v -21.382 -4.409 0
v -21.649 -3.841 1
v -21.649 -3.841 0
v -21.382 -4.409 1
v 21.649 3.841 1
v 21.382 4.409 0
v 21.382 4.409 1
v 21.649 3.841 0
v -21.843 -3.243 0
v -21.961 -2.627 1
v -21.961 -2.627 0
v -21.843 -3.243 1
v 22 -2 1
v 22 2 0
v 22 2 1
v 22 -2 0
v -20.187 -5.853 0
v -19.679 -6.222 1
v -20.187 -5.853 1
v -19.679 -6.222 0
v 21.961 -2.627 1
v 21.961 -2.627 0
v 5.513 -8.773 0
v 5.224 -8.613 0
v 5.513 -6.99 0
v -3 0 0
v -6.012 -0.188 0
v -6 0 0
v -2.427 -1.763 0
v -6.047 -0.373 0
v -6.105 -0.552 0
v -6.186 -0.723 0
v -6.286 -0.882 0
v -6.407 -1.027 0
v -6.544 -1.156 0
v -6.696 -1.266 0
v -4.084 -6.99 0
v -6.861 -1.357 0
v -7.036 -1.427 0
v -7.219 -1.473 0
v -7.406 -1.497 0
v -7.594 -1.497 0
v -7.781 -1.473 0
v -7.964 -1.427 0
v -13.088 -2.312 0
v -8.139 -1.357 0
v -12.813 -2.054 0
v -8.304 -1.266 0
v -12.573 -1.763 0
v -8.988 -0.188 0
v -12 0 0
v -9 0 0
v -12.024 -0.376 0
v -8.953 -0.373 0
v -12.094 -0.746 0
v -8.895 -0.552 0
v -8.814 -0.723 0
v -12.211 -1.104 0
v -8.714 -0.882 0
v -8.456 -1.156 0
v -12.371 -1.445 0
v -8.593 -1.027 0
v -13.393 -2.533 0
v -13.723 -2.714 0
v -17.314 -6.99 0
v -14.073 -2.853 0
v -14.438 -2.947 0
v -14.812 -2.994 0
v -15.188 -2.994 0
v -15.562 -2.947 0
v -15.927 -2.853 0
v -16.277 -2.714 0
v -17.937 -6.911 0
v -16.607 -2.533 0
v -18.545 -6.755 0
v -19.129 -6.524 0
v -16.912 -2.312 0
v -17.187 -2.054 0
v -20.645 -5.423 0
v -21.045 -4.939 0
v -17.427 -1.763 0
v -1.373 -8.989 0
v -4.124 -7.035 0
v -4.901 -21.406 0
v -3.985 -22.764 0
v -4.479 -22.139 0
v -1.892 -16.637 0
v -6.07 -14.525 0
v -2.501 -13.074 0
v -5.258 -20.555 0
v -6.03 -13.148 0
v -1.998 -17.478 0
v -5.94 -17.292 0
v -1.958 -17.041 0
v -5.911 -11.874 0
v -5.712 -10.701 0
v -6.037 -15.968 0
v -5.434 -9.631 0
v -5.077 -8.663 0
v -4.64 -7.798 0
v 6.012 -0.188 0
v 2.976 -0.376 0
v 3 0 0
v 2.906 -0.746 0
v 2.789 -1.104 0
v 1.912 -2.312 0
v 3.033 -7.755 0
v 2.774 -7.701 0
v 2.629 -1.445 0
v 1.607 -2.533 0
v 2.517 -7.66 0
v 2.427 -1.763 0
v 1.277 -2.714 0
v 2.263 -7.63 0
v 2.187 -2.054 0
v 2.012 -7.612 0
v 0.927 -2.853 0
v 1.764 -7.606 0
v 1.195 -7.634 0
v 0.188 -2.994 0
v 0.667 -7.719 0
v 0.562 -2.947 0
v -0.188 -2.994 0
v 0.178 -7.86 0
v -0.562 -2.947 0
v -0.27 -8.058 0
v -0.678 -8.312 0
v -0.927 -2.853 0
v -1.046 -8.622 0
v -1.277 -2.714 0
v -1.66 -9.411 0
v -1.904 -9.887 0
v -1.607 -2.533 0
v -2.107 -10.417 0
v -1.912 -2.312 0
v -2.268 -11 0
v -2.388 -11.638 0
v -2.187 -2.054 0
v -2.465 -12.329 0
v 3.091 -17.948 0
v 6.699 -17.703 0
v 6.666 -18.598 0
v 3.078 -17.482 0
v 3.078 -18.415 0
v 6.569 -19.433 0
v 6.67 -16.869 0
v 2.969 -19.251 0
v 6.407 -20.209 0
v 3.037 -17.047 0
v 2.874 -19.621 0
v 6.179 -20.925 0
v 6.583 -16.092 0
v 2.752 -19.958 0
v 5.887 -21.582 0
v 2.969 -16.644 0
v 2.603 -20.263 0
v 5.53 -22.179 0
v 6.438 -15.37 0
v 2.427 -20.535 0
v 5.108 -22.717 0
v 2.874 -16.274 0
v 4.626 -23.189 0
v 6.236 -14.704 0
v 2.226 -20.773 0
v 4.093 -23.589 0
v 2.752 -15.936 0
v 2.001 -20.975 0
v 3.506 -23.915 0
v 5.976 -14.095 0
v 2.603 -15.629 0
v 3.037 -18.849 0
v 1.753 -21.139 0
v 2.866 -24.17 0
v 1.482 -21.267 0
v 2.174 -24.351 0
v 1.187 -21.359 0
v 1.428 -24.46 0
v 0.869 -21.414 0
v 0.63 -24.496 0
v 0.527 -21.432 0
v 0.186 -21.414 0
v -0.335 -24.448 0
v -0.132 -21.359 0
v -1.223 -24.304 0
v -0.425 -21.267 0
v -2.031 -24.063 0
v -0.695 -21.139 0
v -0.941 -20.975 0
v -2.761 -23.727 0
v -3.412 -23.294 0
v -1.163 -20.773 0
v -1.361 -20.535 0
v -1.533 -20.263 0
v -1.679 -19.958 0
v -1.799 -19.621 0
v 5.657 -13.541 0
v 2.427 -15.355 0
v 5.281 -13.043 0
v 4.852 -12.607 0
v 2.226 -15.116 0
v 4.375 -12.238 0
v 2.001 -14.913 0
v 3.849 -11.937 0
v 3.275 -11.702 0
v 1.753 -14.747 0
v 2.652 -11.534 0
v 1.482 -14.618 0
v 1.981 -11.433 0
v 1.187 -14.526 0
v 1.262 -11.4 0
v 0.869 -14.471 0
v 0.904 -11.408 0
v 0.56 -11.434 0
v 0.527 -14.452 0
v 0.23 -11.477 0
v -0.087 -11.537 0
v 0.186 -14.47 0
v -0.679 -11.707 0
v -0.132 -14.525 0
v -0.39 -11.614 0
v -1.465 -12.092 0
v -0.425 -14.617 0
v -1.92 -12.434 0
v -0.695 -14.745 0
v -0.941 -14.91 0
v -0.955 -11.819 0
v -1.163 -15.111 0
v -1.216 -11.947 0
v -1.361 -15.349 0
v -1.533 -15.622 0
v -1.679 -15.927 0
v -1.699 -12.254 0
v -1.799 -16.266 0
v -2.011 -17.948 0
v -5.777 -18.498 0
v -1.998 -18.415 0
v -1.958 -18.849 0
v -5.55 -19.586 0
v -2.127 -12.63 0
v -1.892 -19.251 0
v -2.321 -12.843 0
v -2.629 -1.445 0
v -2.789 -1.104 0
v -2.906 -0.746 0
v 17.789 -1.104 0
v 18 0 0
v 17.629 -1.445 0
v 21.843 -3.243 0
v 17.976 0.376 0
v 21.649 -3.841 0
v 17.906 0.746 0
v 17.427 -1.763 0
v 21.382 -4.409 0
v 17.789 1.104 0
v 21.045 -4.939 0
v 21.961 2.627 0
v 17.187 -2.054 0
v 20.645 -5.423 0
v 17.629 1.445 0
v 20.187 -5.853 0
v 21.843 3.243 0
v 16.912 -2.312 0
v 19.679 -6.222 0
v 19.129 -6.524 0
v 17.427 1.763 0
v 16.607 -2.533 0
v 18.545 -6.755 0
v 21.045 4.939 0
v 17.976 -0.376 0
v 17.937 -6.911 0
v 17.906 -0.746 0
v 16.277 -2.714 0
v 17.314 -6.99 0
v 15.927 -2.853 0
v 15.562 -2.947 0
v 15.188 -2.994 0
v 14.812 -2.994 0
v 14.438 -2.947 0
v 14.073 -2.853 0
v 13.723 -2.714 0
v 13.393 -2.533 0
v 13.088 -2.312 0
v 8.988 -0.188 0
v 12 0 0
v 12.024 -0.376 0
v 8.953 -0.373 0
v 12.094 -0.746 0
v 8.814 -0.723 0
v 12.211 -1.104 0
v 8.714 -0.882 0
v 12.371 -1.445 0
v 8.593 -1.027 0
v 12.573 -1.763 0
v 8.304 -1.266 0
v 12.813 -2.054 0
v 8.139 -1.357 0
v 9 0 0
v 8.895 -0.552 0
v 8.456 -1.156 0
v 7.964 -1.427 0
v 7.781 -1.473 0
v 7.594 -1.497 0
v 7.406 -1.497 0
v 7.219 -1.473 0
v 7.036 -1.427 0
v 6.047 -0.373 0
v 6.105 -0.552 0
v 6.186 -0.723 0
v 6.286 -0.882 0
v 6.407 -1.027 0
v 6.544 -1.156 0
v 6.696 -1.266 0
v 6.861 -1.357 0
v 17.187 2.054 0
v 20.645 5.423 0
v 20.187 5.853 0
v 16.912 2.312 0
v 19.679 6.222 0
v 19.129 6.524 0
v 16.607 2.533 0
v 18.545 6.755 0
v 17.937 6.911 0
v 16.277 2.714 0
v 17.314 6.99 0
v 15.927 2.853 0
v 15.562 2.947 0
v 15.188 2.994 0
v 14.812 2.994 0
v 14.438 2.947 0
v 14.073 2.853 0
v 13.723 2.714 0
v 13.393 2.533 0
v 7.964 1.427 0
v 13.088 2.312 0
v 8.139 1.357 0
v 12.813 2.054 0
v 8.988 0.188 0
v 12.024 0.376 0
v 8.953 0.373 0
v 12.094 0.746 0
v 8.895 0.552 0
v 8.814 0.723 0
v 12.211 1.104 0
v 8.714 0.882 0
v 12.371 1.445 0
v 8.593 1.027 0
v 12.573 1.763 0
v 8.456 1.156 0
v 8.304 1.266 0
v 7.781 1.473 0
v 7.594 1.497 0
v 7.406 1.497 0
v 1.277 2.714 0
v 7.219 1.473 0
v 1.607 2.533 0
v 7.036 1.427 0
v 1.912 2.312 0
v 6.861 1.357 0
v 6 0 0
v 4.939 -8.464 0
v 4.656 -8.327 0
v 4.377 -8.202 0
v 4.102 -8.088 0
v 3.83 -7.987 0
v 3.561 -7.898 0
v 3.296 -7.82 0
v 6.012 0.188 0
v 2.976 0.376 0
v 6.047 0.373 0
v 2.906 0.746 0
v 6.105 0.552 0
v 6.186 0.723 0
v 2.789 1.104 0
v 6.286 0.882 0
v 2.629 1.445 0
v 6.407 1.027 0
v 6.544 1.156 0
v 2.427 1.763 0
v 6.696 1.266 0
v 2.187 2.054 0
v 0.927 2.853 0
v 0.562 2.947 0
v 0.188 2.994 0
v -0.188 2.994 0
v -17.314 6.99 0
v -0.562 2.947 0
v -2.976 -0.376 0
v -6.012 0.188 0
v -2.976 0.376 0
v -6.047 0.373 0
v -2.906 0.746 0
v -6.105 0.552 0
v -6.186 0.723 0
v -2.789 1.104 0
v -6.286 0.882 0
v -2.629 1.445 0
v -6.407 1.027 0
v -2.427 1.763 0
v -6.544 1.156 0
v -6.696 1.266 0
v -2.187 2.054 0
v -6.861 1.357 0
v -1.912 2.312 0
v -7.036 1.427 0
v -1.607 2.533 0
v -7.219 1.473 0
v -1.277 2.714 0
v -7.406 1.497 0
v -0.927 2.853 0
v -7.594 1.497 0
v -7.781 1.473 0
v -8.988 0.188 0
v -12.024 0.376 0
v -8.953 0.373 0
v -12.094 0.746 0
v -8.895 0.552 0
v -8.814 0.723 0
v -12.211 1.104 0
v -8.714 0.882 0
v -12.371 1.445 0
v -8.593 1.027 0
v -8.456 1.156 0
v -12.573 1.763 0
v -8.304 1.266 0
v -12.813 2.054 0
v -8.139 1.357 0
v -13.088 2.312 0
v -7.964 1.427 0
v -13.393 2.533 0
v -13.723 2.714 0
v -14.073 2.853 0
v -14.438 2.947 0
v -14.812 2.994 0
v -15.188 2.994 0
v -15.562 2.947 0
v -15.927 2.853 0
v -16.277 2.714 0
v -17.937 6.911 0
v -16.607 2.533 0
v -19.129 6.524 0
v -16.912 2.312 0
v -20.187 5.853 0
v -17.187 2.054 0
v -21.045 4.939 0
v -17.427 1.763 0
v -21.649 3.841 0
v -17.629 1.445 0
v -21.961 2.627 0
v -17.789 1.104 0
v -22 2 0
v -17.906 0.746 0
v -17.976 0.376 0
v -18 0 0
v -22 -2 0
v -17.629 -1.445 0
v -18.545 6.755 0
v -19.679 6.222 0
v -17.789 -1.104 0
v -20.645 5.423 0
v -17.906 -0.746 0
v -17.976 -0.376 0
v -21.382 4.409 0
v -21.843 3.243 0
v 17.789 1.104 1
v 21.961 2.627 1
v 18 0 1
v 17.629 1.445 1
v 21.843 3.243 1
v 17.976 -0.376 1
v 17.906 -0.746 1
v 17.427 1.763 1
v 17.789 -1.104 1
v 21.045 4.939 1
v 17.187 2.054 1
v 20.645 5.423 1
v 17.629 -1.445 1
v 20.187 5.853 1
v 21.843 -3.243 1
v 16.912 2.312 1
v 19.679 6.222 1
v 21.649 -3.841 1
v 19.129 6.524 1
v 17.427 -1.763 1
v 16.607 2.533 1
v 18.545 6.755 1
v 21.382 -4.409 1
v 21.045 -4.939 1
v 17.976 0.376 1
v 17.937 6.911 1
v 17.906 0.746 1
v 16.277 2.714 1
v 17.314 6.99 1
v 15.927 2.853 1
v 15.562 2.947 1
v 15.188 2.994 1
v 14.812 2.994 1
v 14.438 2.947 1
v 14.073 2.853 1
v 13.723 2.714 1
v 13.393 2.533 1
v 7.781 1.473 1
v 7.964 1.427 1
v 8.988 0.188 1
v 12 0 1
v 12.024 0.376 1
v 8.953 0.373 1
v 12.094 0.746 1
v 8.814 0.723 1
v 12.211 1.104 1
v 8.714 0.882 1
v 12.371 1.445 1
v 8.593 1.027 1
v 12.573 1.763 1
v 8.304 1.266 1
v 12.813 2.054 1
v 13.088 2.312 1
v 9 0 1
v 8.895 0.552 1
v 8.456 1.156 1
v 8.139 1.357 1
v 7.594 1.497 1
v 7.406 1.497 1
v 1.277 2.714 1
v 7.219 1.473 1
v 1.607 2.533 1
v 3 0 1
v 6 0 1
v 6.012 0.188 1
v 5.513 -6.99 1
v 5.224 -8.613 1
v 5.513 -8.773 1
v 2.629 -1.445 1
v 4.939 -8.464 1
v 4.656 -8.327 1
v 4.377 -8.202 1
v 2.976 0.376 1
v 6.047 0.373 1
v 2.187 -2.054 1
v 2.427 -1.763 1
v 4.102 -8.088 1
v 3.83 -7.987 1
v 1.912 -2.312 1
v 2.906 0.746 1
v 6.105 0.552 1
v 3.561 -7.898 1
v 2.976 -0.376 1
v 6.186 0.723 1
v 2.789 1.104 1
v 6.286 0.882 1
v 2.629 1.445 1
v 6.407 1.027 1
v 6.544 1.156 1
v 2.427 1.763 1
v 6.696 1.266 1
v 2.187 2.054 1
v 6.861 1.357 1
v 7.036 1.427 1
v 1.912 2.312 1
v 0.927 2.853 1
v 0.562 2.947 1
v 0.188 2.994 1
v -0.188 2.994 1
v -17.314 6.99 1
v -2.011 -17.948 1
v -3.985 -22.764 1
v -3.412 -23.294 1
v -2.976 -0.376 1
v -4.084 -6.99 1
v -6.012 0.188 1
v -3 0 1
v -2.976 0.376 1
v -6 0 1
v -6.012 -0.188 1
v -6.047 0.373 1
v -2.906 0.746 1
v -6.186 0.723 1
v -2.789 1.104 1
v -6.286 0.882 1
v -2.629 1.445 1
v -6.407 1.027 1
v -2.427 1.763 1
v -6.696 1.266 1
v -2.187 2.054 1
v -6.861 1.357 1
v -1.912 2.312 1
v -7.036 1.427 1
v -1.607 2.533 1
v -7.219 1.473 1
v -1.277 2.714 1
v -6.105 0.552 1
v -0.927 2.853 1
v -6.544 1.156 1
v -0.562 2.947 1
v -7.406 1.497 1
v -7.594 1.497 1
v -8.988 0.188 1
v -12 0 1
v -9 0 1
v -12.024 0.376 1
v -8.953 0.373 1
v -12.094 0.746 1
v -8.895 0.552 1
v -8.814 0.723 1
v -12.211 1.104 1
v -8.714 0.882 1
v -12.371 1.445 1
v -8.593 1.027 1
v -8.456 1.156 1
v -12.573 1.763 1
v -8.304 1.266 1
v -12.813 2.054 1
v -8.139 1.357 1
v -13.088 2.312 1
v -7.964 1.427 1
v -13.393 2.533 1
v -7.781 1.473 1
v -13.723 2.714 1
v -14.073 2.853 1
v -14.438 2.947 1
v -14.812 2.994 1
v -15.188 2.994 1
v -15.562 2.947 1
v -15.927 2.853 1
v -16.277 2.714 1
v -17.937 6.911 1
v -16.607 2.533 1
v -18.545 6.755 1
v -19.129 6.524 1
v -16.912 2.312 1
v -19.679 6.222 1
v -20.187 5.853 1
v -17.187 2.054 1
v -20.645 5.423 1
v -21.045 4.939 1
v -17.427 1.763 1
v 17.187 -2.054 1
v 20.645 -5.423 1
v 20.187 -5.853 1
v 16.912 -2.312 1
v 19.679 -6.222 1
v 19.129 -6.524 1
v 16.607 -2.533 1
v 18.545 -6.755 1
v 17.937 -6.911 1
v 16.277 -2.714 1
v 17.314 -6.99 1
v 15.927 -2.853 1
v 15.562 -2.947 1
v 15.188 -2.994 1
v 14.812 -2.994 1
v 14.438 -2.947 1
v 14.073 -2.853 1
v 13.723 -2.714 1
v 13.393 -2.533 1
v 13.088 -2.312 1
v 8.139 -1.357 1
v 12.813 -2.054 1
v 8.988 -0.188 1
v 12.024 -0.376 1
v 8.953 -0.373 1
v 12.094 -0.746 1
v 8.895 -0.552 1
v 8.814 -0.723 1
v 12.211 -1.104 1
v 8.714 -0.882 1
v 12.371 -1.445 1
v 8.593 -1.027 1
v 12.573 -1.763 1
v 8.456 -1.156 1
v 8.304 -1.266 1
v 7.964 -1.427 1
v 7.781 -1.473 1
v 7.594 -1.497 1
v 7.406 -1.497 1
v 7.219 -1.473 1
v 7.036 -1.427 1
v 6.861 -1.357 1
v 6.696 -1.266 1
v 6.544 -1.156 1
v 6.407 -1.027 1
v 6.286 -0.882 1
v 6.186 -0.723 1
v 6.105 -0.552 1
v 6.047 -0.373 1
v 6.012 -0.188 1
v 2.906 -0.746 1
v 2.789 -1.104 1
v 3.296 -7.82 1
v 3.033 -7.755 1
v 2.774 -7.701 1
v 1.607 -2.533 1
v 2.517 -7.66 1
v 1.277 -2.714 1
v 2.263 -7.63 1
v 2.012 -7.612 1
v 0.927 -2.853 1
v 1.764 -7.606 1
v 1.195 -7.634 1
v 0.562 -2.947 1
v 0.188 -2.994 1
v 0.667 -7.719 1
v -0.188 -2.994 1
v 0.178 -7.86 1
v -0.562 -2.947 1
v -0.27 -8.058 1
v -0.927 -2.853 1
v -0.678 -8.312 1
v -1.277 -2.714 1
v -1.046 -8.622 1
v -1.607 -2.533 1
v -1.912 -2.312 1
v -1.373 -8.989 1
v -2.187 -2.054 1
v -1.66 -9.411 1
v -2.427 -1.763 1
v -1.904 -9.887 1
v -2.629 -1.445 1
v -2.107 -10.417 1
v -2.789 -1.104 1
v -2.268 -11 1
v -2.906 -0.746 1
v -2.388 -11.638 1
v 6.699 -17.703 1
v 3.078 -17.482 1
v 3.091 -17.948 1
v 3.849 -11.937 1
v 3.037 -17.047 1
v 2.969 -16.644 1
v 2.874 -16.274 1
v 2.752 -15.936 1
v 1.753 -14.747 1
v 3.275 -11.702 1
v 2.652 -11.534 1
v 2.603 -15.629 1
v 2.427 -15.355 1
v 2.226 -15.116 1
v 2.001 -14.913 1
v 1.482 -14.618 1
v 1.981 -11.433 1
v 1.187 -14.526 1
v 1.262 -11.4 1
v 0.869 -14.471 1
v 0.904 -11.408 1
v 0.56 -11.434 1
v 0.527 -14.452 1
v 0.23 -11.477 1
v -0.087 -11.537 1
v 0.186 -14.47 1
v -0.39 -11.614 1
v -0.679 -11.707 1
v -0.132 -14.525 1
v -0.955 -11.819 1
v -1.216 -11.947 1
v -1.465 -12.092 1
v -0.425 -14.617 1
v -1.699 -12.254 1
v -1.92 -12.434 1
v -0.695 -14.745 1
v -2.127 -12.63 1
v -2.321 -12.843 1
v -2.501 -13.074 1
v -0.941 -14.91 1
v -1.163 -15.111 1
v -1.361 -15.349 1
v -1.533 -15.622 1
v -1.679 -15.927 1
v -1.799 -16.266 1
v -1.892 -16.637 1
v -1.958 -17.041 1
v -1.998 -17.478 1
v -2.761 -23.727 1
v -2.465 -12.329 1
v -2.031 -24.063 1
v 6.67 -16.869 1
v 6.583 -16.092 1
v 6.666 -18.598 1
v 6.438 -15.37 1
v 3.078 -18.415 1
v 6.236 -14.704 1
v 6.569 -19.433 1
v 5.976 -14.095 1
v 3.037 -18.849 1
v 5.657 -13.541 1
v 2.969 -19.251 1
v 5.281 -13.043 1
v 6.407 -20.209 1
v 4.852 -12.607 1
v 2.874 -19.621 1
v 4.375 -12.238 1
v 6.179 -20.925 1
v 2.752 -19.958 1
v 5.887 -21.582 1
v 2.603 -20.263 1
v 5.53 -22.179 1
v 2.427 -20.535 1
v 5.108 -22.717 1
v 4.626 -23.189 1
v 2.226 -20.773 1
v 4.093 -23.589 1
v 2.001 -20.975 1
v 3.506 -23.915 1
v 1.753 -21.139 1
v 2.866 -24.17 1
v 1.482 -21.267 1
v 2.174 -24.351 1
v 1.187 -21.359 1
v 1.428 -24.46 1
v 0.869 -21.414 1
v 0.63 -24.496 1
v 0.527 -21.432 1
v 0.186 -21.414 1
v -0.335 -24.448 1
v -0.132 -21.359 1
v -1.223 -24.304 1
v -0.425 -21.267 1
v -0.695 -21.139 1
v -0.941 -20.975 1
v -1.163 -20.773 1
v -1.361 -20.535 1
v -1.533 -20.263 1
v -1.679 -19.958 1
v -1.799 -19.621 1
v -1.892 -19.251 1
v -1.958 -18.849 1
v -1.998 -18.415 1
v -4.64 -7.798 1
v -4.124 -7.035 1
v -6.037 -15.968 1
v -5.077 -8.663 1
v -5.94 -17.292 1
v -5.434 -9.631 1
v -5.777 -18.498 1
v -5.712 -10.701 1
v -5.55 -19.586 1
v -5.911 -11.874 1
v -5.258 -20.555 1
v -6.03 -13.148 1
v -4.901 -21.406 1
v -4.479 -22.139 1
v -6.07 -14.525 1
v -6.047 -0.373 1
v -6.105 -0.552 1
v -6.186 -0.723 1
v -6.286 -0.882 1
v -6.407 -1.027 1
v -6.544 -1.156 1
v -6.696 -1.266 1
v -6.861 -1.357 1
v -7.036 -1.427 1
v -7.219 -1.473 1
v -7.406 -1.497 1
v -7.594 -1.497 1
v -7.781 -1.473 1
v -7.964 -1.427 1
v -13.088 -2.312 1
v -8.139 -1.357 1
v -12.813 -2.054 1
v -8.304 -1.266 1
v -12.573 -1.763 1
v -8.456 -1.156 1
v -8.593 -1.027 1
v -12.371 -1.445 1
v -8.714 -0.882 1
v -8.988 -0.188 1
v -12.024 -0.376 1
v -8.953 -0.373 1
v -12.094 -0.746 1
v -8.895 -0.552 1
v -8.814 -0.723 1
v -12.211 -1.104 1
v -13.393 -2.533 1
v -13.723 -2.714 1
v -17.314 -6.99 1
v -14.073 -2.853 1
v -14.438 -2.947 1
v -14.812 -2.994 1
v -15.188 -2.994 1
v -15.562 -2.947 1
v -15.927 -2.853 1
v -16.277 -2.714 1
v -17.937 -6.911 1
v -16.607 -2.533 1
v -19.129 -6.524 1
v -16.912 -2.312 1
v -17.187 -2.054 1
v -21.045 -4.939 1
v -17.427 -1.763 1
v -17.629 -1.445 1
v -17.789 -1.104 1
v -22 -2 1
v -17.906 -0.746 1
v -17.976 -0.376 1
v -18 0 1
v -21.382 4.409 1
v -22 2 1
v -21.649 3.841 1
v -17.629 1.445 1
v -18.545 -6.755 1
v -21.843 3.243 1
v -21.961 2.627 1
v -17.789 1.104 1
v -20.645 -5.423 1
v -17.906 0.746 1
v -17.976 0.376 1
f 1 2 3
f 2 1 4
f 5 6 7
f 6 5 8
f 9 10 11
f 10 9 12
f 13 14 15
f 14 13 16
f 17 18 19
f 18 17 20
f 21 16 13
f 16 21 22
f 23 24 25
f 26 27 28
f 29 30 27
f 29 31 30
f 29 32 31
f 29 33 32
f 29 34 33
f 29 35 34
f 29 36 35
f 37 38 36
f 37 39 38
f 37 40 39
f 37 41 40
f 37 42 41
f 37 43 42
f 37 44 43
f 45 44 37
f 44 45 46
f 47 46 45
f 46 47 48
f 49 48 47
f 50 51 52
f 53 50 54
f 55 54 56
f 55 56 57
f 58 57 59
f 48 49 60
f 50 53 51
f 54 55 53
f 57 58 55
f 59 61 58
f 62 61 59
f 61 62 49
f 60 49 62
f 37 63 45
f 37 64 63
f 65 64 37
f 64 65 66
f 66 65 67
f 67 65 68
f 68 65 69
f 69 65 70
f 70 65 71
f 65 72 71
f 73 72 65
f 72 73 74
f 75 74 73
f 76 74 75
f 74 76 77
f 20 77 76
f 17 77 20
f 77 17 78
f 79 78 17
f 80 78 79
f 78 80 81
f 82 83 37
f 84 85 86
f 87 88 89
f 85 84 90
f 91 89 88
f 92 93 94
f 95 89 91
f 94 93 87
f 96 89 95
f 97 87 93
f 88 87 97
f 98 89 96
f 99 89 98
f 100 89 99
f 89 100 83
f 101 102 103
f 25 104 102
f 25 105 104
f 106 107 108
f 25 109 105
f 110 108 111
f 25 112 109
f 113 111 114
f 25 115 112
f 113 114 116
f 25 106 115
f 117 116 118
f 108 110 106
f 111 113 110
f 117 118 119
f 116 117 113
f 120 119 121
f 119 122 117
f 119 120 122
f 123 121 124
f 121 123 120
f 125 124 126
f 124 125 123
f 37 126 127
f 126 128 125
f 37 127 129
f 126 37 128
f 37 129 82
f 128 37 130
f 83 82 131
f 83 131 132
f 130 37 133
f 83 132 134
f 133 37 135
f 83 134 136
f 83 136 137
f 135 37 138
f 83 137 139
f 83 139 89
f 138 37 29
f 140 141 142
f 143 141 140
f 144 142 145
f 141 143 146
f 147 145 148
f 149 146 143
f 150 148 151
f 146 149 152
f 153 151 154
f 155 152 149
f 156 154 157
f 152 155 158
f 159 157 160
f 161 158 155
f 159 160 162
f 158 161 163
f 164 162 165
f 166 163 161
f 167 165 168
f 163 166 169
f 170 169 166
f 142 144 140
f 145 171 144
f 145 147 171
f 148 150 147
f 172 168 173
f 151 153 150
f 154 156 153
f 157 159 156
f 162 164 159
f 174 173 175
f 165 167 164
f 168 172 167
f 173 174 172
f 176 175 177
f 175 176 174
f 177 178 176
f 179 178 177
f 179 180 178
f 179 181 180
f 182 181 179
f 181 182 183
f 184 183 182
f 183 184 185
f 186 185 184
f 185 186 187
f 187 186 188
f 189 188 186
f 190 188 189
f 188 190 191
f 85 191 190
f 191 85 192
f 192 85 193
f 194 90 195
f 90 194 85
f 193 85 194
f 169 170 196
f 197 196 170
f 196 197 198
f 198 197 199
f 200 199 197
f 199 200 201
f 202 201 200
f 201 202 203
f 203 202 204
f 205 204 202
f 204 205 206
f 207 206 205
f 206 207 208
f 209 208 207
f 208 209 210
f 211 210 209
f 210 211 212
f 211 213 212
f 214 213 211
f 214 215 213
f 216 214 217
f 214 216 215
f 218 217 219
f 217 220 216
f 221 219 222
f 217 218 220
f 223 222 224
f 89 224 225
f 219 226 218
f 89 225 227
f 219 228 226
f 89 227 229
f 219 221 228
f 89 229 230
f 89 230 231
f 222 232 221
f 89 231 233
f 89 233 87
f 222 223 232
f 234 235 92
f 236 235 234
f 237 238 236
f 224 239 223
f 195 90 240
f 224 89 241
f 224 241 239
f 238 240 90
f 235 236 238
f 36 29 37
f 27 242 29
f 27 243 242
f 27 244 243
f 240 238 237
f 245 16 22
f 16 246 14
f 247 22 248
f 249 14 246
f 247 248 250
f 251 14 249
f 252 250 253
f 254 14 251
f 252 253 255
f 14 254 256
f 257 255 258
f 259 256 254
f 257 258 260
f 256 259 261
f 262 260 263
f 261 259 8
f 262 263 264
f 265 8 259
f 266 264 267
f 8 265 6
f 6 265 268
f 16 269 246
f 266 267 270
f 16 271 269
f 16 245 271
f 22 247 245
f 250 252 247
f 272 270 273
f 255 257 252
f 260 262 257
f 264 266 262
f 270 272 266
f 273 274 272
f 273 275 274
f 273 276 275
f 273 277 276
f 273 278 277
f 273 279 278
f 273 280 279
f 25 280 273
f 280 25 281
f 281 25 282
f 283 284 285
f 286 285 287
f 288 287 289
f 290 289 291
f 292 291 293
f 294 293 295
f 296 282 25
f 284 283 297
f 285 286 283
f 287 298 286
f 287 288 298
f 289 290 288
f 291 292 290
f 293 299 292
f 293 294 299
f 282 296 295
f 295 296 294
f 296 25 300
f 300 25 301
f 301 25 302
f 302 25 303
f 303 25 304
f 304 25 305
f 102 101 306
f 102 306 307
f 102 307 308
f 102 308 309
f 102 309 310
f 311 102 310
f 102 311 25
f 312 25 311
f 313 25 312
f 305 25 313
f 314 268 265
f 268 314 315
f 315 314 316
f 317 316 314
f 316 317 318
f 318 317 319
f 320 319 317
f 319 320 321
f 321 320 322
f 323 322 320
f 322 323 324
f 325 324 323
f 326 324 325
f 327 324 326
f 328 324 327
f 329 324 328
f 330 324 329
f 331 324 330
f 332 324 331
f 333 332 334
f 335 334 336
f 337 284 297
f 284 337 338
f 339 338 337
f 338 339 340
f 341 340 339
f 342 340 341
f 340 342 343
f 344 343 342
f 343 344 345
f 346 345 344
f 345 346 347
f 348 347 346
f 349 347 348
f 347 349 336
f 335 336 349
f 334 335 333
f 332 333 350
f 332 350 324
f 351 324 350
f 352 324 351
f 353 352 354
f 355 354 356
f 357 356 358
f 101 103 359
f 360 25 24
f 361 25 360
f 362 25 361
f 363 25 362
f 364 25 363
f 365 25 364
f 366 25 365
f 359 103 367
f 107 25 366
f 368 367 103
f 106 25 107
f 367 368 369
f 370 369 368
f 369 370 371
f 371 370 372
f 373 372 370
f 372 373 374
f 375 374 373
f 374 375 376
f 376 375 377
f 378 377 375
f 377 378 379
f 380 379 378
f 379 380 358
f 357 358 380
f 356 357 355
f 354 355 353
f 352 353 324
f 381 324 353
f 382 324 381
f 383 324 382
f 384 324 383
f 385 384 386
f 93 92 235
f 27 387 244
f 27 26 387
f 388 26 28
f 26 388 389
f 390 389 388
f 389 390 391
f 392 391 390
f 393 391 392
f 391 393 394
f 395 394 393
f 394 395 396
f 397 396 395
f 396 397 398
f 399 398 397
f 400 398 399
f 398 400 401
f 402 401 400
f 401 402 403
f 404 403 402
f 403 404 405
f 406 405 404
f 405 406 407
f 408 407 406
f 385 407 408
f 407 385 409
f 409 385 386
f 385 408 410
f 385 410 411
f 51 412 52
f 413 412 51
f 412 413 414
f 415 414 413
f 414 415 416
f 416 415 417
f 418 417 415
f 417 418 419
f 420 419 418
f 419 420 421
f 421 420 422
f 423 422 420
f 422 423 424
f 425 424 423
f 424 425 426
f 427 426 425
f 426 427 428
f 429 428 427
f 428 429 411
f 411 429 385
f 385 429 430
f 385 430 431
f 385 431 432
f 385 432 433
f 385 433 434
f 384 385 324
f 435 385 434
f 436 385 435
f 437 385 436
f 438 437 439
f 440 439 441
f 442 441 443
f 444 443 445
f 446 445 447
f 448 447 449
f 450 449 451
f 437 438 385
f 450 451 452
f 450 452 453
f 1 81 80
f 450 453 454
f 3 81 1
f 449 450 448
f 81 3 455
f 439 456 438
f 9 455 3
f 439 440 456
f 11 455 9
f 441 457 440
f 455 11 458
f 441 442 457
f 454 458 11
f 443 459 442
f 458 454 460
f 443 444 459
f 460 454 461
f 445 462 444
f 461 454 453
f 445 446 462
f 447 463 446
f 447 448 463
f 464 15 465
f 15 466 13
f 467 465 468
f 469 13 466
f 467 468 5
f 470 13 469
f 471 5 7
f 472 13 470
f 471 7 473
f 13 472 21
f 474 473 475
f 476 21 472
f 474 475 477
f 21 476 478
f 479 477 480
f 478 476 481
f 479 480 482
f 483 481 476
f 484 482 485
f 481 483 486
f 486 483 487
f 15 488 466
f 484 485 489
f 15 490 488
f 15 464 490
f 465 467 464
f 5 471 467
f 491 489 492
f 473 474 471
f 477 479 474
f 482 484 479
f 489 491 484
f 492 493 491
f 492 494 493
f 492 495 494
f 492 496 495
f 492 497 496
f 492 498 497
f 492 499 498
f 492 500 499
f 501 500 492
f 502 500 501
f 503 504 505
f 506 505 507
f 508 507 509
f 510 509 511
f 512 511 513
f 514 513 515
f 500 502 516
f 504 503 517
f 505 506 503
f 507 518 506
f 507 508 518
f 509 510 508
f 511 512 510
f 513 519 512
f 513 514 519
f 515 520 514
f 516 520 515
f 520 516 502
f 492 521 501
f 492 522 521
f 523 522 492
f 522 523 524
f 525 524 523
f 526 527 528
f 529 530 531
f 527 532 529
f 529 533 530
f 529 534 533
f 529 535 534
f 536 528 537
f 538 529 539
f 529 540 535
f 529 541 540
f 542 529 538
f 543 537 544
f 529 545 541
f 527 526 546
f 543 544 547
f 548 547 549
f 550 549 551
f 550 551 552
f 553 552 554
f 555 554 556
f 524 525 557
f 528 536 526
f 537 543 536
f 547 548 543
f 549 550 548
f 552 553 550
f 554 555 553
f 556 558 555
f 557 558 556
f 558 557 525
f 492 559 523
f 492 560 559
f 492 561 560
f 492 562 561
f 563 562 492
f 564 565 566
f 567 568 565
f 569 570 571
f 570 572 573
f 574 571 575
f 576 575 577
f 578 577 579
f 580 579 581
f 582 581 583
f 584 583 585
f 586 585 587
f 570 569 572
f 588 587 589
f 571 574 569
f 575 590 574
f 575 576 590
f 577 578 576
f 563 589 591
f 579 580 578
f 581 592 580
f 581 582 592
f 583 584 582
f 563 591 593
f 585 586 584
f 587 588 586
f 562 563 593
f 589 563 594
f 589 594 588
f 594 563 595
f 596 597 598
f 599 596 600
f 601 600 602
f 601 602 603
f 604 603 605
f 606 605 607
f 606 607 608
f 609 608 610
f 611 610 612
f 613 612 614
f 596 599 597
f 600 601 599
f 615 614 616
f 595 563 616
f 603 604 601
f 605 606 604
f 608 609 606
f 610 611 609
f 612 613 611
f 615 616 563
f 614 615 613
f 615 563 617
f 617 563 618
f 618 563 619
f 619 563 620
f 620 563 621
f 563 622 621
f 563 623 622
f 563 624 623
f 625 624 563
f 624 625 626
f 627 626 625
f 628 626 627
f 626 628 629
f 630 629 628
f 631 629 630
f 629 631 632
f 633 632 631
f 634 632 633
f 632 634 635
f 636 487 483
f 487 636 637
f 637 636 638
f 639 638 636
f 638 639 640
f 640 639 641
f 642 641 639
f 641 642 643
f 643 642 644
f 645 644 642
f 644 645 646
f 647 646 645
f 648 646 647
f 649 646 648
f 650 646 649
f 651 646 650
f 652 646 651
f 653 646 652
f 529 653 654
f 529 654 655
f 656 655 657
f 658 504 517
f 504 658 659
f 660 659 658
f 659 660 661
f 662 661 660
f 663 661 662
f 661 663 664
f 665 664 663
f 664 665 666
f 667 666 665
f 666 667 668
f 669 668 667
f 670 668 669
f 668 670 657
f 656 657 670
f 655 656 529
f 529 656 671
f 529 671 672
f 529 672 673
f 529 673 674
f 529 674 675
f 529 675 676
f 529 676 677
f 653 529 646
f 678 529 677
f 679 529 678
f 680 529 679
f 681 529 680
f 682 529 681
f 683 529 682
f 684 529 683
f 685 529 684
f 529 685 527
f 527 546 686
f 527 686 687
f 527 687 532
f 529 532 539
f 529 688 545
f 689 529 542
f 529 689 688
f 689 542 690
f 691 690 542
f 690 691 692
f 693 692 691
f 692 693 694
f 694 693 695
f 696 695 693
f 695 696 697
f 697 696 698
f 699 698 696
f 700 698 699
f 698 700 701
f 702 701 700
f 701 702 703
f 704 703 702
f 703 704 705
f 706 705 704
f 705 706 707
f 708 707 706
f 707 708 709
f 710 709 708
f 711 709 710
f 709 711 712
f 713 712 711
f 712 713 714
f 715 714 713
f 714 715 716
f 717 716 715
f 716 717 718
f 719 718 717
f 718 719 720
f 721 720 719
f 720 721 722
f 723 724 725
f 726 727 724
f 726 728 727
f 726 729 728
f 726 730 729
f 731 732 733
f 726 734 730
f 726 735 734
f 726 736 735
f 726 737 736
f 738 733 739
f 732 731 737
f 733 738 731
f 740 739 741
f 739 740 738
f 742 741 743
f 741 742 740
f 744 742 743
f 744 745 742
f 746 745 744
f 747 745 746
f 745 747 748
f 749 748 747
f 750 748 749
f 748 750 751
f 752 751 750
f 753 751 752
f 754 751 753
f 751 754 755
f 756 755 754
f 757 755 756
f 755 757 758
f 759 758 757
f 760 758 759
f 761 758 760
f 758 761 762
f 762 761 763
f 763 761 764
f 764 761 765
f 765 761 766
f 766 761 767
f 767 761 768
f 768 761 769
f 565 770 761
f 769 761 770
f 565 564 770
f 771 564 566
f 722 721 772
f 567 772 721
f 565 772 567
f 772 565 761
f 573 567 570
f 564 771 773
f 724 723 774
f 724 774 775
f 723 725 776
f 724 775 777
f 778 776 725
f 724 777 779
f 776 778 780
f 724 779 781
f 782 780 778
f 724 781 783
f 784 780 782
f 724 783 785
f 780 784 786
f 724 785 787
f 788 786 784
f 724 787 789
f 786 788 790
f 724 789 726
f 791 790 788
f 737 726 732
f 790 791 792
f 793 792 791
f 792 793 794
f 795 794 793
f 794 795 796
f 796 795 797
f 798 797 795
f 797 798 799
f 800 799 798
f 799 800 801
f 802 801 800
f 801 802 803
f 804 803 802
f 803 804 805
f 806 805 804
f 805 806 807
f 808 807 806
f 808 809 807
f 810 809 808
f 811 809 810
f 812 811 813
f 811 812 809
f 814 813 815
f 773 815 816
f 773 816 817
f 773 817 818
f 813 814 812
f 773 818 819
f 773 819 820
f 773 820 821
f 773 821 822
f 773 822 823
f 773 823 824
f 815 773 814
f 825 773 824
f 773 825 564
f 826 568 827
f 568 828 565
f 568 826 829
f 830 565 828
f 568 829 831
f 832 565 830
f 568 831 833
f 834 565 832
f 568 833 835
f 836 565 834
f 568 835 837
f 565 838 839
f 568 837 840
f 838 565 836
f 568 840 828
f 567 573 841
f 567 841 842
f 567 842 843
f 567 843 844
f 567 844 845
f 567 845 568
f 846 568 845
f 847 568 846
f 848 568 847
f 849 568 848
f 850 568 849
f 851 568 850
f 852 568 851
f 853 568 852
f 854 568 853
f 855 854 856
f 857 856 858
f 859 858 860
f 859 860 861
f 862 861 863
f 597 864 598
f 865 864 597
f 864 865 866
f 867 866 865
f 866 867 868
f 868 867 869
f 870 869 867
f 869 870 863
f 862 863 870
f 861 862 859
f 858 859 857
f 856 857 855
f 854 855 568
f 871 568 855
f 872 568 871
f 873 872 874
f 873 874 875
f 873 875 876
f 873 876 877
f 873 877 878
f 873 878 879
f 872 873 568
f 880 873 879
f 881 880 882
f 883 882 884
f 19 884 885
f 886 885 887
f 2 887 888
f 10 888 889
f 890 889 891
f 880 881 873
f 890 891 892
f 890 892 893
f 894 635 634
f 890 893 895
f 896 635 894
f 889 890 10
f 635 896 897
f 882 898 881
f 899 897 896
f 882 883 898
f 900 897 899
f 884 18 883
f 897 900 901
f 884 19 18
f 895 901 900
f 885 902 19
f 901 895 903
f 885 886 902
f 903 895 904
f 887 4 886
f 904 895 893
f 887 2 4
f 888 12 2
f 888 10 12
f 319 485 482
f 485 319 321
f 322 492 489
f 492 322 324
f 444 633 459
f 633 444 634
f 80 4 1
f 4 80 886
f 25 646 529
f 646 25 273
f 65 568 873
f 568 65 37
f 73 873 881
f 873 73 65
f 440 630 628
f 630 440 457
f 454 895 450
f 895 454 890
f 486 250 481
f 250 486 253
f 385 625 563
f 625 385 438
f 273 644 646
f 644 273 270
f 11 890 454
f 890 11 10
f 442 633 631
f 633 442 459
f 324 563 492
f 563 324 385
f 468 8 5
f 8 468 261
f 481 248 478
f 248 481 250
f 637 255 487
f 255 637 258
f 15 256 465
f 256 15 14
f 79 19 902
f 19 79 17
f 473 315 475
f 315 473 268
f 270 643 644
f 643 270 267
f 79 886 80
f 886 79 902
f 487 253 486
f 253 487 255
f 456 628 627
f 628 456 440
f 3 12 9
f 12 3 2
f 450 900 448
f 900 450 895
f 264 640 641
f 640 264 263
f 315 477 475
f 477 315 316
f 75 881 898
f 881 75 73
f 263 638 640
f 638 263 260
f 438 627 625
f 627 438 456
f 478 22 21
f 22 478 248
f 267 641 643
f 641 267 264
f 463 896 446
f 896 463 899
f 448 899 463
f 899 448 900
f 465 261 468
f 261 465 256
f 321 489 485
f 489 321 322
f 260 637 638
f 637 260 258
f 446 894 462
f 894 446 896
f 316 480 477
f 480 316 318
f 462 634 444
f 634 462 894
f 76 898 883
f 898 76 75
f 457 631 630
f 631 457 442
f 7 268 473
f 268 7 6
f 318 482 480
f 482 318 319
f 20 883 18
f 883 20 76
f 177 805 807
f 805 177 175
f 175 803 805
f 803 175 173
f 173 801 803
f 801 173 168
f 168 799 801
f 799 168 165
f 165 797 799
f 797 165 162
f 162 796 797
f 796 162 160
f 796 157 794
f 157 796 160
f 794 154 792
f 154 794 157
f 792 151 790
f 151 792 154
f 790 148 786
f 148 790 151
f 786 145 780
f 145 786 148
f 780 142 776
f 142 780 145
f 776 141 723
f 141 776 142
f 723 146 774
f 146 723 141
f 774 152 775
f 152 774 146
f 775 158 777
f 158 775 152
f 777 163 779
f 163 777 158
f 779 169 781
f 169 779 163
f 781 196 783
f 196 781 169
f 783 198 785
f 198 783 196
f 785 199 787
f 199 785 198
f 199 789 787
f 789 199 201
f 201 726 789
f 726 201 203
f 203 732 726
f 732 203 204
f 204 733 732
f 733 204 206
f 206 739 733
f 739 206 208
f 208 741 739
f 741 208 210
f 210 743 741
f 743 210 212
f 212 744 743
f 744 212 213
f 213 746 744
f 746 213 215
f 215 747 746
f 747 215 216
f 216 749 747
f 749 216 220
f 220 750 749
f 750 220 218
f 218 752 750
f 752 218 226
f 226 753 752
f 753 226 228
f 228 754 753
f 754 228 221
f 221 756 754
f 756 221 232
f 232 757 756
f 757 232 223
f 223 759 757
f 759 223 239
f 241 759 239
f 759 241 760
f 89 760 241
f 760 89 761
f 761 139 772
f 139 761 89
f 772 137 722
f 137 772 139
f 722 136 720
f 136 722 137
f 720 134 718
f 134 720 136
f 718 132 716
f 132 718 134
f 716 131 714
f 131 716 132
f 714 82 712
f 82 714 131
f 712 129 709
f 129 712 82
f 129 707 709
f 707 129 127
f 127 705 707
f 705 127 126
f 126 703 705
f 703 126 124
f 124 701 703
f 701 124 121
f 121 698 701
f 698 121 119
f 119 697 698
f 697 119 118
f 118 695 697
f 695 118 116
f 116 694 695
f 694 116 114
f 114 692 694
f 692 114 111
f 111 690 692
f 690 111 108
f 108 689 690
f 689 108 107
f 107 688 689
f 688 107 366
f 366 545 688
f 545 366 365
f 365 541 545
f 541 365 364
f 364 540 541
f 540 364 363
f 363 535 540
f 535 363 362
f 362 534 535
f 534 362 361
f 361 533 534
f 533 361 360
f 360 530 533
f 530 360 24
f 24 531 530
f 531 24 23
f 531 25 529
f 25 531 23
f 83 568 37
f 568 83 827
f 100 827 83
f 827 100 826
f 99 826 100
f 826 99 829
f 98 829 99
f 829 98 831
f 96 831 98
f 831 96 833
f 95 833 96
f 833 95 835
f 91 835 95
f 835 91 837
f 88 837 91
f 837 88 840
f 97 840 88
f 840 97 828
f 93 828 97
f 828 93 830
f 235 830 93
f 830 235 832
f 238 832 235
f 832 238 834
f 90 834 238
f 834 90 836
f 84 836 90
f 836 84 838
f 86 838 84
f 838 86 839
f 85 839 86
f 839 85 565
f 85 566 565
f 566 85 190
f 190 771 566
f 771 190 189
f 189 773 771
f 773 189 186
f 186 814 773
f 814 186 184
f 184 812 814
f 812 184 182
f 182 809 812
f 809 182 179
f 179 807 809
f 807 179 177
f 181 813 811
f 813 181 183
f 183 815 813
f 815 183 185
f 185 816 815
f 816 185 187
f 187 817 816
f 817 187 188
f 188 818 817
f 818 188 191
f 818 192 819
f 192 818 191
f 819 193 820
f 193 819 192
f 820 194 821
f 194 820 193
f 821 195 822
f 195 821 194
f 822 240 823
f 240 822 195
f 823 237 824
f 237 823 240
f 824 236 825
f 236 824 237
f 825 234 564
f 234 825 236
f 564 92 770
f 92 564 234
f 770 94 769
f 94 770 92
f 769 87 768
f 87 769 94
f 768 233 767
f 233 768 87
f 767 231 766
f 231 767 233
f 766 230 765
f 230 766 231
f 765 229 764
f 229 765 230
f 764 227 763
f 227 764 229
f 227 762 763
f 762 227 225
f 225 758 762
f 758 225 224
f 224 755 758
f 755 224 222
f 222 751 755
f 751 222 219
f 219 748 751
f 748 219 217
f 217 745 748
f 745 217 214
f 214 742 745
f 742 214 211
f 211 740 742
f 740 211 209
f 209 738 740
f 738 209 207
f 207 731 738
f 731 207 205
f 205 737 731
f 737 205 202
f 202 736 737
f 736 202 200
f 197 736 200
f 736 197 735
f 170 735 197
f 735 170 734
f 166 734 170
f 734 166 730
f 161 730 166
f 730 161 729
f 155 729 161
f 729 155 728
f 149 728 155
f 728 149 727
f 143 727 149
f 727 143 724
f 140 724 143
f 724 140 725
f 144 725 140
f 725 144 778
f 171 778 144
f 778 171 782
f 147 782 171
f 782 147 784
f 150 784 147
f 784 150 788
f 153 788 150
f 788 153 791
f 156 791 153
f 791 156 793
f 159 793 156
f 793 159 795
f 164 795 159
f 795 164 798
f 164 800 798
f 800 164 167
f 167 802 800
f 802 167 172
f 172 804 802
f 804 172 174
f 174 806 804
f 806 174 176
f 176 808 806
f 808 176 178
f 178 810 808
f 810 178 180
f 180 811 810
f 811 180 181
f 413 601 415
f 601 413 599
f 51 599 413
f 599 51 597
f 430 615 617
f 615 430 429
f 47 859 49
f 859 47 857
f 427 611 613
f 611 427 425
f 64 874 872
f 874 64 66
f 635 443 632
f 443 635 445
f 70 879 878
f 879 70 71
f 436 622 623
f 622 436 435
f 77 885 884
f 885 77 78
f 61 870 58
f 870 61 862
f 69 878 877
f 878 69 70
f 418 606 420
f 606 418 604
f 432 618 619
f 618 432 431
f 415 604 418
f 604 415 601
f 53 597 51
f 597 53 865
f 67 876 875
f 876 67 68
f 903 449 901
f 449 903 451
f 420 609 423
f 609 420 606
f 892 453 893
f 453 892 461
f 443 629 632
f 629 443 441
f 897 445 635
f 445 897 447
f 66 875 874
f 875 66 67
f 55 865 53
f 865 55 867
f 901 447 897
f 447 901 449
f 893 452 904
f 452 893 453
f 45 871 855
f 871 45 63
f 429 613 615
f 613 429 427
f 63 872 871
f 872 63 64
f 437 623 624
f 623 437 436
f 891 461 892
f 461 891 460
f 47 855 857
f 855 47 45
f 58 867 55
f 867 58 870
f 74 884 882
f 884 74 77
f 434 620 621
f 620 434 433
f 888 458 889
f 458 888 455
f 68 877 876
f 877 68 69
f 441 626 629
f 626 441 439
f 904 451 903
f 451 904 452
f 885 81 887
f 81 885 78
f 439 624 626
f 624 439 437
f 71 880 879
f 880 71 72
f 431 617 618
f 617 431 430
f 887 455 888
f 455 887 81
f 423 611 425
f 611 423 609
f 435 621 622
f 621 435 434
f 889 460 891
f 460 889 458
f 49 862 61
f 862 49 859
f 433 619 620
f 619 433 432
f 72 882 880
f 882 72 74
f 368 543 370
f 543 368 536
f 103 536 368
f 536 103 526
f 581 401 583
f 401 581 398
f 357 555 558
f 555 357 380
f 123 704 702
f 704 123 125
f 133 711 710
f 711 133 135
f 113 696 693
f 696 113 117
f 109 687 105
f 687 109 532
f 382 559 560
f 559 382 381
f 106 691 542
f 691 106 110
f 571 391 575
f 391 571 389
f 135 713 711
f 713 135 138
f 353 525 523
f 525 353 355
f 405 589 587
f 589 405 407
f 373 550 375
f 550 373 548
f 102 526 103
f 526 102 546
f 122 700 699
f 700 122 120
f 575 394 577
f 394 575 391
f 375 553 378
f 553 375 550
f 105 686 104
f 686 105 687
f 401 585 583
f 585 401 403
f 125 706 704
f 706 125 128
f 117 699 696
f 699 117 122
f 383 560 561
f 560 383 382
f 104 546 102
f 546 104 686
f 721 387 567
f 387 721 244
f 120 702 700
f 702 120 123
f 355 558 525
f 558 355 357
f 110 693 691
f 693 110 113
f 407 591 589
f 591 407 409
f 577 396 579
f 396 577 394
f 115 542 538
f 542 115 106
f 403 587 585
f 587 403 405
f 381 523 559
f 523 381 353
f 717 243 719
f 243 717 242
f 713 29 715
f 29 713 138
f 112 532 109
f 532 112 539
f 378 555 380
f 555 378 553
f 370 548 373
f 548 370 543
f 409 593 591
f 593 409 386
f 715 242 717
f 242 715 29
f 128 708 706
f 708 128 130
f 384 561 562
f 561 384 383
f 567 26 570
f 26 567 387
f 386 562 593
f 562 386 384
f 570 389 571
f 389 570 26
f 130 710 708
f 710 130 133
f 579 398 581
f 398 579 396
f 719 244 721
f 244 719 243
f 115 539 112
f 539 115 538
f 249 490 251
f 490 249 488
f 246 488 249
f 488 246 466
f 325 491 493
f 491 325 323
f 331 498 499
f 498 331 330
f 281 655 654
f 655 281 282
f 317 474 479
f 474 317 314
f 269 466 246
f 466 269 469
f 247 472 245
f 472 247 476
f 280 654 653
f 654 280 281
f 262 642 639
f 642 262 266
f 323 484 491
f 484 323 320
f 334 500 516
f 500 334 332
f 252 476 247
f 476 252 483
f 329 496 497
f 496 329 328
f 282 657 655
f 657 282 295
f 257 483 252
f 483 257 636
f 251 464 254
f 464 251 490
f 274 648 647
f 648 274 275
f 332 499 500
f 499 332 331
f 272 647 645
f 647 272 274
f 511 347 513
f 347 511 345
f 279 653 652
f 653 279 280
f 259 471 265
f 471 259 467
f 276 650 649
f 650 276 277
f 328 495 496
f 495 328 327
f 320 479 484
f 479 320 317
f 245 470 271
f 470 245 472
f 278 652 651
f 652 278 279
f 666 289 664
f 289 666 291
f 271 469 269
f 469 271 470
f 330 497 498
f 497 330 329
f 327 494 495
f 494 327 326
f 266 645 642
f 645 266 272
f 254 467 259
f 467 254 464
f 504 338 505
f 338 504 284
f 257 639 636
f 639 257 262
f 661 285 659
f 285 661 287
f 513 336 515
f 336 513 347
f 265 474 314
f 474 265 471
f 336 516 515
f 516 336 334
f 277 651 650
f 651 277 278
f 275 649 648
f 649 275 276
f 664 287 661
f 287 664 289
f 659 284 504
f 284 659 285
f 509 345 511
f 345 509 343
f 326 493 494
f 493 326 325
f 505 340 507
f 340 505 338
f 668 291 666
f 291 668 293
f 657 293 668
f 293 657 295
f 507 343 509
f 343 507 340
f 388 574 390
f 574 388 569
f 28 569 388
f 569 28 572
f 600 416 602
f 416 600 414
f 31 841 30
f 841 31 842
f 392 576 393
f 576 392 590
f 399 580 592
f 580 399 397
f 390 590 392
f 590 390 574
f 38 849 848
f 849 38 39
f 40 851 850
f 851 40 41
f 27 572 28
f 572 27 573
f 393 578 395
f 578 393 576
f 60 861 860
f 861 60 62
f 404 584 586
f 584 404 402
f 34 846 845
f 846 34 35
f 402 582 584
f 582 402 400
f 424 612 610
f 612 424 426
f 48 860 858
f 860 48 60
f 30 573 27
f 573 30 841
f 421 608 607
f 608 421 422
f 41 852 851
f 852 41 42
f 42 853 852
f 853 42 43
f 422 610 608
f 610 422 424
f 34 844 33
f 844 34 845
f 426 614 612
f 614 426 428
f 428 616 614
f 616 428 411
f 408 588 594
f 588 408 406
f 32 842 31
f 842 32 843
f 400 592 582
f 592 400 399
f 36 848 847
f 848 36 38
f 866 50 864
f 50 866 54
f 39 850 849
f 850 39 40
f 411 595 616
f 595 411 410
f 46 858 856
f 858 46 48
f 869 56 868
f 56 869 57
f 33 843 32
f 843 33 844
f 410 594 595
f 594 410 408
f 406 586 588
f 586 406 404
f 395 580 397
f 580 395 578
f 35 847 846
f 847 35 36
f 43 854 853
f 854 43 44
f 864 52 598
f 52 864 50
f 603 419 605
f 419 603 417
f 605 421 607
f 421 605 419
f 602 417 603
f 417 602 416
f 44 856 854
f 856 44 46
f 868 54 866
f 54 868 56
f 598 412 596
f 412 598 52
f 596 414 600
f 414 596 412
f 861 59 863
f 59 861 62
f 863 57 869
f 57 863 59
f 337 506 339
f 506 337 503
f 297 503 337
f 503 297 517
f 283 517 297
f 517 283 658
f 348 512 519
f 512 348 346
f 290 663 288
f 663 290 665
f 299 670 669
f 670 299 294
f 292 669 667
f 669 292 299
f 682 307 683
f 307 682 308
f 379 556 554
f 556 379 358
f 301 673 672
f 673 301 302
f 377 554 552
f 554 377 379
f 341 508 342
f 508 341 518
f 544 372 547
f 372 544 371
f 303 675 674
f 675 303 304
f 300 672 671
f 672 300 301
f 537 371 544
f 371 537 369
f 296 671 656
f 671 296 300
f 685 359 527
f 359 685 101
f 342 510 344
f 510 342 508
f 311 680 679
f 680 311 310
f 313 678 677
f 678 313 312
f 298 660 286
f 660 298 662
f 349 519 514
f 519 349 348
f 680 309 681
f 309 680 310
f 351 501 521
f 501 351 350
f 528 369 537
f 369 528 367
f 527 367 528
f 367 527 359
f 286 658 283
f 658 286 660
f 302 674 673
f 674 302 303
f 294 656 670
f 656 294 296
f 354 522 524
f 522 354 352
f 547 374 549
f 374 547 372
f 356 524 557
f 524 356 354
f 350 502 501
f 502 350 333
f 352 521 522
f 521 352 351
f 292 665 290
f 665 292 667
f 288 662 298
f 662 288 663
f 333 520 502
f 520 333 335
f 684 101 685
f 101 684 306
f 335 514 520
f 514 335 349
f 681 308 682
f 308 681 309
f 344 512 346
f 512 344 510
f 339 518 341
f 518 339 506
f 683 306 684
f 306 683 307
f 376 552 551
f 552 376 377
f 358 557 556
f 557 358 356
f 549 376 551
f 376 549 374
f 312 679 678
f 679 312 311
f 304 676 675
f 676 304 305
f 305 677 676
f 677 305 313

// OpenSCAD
$fn = 50;


difference() {
	union() {
		hull() {
			translate(v = [-17.0000000000, 2.0000000000, 0]) {
				cylinder(h = 1, r = 5);
			}
			translate(v = [17.0000000000, 2.0000000000, 0]) {
				cylinder(h = 1, r = 5);
			}
			translate(v = [-17.0000000000, -2.0000000000, 0]) {
				cylinder(h = 1, r = 5);
			}
			translate(v = [17.0000000000, -2.0000000000, 0]) {
				cylinder(h = 1, r = 5);
			}
		}
		translate(v = [0, -5, 0]) {
			linear_extrude(height = 1) {
				text(font = "DejaVu Sans Mono:style=Bold", halign = "center", size = 19.0000000000, text = "6", valign = "top");
			}
		}
	}
	union() {
		translate(v = [-15.0000000000, 0.0000000000, 0]) {
			translate(v = [0, 0, -100]) {
				cylinder(h = 200, r = 3.0000000000);
			}
		}
		translate(v = [0, 0, -100]) {
			cylinder(h = 200, r = 3.0000000000);
		}
		translate(v = [15.0000000000, 0.0000000000, 0]) {
			translate(v = [0, 0, -100]) {
				cylinder(h = 200, r = 3.0000000000);
			}
		}
		translate(v = [-15.0000000000, 0.0000000000, 0]) {
			translate(v = [0, 0, -100]) {
				cylinder(h = 200, r = 1.5000000000);
			}
		}
		translate(v = [-7.5000000000, 0.0000000000, 0]) {
			translate(v = [0, 0, -100]) {
				cylinder(h = 200, r = 1.5000000000);
			}
		}
		translate(v = [0, 0, -100]) {
			cylinder(h = 200, r = 1.5000000000);
		}
		translate(v = [7.5000000000, 0.0000000000, 0]) {
			translate(v = [0, 0, -100]) {
				cylinder(h = 200, r = 1.5000000000);
			}
		}
		translate(v = [15.0000000000, 0.0000000000, 0]) {
			translate(v = [0, 0, -100]) {
				cylinder(h = 200, r = 1.5000000000);
			}
		}
	}
}
